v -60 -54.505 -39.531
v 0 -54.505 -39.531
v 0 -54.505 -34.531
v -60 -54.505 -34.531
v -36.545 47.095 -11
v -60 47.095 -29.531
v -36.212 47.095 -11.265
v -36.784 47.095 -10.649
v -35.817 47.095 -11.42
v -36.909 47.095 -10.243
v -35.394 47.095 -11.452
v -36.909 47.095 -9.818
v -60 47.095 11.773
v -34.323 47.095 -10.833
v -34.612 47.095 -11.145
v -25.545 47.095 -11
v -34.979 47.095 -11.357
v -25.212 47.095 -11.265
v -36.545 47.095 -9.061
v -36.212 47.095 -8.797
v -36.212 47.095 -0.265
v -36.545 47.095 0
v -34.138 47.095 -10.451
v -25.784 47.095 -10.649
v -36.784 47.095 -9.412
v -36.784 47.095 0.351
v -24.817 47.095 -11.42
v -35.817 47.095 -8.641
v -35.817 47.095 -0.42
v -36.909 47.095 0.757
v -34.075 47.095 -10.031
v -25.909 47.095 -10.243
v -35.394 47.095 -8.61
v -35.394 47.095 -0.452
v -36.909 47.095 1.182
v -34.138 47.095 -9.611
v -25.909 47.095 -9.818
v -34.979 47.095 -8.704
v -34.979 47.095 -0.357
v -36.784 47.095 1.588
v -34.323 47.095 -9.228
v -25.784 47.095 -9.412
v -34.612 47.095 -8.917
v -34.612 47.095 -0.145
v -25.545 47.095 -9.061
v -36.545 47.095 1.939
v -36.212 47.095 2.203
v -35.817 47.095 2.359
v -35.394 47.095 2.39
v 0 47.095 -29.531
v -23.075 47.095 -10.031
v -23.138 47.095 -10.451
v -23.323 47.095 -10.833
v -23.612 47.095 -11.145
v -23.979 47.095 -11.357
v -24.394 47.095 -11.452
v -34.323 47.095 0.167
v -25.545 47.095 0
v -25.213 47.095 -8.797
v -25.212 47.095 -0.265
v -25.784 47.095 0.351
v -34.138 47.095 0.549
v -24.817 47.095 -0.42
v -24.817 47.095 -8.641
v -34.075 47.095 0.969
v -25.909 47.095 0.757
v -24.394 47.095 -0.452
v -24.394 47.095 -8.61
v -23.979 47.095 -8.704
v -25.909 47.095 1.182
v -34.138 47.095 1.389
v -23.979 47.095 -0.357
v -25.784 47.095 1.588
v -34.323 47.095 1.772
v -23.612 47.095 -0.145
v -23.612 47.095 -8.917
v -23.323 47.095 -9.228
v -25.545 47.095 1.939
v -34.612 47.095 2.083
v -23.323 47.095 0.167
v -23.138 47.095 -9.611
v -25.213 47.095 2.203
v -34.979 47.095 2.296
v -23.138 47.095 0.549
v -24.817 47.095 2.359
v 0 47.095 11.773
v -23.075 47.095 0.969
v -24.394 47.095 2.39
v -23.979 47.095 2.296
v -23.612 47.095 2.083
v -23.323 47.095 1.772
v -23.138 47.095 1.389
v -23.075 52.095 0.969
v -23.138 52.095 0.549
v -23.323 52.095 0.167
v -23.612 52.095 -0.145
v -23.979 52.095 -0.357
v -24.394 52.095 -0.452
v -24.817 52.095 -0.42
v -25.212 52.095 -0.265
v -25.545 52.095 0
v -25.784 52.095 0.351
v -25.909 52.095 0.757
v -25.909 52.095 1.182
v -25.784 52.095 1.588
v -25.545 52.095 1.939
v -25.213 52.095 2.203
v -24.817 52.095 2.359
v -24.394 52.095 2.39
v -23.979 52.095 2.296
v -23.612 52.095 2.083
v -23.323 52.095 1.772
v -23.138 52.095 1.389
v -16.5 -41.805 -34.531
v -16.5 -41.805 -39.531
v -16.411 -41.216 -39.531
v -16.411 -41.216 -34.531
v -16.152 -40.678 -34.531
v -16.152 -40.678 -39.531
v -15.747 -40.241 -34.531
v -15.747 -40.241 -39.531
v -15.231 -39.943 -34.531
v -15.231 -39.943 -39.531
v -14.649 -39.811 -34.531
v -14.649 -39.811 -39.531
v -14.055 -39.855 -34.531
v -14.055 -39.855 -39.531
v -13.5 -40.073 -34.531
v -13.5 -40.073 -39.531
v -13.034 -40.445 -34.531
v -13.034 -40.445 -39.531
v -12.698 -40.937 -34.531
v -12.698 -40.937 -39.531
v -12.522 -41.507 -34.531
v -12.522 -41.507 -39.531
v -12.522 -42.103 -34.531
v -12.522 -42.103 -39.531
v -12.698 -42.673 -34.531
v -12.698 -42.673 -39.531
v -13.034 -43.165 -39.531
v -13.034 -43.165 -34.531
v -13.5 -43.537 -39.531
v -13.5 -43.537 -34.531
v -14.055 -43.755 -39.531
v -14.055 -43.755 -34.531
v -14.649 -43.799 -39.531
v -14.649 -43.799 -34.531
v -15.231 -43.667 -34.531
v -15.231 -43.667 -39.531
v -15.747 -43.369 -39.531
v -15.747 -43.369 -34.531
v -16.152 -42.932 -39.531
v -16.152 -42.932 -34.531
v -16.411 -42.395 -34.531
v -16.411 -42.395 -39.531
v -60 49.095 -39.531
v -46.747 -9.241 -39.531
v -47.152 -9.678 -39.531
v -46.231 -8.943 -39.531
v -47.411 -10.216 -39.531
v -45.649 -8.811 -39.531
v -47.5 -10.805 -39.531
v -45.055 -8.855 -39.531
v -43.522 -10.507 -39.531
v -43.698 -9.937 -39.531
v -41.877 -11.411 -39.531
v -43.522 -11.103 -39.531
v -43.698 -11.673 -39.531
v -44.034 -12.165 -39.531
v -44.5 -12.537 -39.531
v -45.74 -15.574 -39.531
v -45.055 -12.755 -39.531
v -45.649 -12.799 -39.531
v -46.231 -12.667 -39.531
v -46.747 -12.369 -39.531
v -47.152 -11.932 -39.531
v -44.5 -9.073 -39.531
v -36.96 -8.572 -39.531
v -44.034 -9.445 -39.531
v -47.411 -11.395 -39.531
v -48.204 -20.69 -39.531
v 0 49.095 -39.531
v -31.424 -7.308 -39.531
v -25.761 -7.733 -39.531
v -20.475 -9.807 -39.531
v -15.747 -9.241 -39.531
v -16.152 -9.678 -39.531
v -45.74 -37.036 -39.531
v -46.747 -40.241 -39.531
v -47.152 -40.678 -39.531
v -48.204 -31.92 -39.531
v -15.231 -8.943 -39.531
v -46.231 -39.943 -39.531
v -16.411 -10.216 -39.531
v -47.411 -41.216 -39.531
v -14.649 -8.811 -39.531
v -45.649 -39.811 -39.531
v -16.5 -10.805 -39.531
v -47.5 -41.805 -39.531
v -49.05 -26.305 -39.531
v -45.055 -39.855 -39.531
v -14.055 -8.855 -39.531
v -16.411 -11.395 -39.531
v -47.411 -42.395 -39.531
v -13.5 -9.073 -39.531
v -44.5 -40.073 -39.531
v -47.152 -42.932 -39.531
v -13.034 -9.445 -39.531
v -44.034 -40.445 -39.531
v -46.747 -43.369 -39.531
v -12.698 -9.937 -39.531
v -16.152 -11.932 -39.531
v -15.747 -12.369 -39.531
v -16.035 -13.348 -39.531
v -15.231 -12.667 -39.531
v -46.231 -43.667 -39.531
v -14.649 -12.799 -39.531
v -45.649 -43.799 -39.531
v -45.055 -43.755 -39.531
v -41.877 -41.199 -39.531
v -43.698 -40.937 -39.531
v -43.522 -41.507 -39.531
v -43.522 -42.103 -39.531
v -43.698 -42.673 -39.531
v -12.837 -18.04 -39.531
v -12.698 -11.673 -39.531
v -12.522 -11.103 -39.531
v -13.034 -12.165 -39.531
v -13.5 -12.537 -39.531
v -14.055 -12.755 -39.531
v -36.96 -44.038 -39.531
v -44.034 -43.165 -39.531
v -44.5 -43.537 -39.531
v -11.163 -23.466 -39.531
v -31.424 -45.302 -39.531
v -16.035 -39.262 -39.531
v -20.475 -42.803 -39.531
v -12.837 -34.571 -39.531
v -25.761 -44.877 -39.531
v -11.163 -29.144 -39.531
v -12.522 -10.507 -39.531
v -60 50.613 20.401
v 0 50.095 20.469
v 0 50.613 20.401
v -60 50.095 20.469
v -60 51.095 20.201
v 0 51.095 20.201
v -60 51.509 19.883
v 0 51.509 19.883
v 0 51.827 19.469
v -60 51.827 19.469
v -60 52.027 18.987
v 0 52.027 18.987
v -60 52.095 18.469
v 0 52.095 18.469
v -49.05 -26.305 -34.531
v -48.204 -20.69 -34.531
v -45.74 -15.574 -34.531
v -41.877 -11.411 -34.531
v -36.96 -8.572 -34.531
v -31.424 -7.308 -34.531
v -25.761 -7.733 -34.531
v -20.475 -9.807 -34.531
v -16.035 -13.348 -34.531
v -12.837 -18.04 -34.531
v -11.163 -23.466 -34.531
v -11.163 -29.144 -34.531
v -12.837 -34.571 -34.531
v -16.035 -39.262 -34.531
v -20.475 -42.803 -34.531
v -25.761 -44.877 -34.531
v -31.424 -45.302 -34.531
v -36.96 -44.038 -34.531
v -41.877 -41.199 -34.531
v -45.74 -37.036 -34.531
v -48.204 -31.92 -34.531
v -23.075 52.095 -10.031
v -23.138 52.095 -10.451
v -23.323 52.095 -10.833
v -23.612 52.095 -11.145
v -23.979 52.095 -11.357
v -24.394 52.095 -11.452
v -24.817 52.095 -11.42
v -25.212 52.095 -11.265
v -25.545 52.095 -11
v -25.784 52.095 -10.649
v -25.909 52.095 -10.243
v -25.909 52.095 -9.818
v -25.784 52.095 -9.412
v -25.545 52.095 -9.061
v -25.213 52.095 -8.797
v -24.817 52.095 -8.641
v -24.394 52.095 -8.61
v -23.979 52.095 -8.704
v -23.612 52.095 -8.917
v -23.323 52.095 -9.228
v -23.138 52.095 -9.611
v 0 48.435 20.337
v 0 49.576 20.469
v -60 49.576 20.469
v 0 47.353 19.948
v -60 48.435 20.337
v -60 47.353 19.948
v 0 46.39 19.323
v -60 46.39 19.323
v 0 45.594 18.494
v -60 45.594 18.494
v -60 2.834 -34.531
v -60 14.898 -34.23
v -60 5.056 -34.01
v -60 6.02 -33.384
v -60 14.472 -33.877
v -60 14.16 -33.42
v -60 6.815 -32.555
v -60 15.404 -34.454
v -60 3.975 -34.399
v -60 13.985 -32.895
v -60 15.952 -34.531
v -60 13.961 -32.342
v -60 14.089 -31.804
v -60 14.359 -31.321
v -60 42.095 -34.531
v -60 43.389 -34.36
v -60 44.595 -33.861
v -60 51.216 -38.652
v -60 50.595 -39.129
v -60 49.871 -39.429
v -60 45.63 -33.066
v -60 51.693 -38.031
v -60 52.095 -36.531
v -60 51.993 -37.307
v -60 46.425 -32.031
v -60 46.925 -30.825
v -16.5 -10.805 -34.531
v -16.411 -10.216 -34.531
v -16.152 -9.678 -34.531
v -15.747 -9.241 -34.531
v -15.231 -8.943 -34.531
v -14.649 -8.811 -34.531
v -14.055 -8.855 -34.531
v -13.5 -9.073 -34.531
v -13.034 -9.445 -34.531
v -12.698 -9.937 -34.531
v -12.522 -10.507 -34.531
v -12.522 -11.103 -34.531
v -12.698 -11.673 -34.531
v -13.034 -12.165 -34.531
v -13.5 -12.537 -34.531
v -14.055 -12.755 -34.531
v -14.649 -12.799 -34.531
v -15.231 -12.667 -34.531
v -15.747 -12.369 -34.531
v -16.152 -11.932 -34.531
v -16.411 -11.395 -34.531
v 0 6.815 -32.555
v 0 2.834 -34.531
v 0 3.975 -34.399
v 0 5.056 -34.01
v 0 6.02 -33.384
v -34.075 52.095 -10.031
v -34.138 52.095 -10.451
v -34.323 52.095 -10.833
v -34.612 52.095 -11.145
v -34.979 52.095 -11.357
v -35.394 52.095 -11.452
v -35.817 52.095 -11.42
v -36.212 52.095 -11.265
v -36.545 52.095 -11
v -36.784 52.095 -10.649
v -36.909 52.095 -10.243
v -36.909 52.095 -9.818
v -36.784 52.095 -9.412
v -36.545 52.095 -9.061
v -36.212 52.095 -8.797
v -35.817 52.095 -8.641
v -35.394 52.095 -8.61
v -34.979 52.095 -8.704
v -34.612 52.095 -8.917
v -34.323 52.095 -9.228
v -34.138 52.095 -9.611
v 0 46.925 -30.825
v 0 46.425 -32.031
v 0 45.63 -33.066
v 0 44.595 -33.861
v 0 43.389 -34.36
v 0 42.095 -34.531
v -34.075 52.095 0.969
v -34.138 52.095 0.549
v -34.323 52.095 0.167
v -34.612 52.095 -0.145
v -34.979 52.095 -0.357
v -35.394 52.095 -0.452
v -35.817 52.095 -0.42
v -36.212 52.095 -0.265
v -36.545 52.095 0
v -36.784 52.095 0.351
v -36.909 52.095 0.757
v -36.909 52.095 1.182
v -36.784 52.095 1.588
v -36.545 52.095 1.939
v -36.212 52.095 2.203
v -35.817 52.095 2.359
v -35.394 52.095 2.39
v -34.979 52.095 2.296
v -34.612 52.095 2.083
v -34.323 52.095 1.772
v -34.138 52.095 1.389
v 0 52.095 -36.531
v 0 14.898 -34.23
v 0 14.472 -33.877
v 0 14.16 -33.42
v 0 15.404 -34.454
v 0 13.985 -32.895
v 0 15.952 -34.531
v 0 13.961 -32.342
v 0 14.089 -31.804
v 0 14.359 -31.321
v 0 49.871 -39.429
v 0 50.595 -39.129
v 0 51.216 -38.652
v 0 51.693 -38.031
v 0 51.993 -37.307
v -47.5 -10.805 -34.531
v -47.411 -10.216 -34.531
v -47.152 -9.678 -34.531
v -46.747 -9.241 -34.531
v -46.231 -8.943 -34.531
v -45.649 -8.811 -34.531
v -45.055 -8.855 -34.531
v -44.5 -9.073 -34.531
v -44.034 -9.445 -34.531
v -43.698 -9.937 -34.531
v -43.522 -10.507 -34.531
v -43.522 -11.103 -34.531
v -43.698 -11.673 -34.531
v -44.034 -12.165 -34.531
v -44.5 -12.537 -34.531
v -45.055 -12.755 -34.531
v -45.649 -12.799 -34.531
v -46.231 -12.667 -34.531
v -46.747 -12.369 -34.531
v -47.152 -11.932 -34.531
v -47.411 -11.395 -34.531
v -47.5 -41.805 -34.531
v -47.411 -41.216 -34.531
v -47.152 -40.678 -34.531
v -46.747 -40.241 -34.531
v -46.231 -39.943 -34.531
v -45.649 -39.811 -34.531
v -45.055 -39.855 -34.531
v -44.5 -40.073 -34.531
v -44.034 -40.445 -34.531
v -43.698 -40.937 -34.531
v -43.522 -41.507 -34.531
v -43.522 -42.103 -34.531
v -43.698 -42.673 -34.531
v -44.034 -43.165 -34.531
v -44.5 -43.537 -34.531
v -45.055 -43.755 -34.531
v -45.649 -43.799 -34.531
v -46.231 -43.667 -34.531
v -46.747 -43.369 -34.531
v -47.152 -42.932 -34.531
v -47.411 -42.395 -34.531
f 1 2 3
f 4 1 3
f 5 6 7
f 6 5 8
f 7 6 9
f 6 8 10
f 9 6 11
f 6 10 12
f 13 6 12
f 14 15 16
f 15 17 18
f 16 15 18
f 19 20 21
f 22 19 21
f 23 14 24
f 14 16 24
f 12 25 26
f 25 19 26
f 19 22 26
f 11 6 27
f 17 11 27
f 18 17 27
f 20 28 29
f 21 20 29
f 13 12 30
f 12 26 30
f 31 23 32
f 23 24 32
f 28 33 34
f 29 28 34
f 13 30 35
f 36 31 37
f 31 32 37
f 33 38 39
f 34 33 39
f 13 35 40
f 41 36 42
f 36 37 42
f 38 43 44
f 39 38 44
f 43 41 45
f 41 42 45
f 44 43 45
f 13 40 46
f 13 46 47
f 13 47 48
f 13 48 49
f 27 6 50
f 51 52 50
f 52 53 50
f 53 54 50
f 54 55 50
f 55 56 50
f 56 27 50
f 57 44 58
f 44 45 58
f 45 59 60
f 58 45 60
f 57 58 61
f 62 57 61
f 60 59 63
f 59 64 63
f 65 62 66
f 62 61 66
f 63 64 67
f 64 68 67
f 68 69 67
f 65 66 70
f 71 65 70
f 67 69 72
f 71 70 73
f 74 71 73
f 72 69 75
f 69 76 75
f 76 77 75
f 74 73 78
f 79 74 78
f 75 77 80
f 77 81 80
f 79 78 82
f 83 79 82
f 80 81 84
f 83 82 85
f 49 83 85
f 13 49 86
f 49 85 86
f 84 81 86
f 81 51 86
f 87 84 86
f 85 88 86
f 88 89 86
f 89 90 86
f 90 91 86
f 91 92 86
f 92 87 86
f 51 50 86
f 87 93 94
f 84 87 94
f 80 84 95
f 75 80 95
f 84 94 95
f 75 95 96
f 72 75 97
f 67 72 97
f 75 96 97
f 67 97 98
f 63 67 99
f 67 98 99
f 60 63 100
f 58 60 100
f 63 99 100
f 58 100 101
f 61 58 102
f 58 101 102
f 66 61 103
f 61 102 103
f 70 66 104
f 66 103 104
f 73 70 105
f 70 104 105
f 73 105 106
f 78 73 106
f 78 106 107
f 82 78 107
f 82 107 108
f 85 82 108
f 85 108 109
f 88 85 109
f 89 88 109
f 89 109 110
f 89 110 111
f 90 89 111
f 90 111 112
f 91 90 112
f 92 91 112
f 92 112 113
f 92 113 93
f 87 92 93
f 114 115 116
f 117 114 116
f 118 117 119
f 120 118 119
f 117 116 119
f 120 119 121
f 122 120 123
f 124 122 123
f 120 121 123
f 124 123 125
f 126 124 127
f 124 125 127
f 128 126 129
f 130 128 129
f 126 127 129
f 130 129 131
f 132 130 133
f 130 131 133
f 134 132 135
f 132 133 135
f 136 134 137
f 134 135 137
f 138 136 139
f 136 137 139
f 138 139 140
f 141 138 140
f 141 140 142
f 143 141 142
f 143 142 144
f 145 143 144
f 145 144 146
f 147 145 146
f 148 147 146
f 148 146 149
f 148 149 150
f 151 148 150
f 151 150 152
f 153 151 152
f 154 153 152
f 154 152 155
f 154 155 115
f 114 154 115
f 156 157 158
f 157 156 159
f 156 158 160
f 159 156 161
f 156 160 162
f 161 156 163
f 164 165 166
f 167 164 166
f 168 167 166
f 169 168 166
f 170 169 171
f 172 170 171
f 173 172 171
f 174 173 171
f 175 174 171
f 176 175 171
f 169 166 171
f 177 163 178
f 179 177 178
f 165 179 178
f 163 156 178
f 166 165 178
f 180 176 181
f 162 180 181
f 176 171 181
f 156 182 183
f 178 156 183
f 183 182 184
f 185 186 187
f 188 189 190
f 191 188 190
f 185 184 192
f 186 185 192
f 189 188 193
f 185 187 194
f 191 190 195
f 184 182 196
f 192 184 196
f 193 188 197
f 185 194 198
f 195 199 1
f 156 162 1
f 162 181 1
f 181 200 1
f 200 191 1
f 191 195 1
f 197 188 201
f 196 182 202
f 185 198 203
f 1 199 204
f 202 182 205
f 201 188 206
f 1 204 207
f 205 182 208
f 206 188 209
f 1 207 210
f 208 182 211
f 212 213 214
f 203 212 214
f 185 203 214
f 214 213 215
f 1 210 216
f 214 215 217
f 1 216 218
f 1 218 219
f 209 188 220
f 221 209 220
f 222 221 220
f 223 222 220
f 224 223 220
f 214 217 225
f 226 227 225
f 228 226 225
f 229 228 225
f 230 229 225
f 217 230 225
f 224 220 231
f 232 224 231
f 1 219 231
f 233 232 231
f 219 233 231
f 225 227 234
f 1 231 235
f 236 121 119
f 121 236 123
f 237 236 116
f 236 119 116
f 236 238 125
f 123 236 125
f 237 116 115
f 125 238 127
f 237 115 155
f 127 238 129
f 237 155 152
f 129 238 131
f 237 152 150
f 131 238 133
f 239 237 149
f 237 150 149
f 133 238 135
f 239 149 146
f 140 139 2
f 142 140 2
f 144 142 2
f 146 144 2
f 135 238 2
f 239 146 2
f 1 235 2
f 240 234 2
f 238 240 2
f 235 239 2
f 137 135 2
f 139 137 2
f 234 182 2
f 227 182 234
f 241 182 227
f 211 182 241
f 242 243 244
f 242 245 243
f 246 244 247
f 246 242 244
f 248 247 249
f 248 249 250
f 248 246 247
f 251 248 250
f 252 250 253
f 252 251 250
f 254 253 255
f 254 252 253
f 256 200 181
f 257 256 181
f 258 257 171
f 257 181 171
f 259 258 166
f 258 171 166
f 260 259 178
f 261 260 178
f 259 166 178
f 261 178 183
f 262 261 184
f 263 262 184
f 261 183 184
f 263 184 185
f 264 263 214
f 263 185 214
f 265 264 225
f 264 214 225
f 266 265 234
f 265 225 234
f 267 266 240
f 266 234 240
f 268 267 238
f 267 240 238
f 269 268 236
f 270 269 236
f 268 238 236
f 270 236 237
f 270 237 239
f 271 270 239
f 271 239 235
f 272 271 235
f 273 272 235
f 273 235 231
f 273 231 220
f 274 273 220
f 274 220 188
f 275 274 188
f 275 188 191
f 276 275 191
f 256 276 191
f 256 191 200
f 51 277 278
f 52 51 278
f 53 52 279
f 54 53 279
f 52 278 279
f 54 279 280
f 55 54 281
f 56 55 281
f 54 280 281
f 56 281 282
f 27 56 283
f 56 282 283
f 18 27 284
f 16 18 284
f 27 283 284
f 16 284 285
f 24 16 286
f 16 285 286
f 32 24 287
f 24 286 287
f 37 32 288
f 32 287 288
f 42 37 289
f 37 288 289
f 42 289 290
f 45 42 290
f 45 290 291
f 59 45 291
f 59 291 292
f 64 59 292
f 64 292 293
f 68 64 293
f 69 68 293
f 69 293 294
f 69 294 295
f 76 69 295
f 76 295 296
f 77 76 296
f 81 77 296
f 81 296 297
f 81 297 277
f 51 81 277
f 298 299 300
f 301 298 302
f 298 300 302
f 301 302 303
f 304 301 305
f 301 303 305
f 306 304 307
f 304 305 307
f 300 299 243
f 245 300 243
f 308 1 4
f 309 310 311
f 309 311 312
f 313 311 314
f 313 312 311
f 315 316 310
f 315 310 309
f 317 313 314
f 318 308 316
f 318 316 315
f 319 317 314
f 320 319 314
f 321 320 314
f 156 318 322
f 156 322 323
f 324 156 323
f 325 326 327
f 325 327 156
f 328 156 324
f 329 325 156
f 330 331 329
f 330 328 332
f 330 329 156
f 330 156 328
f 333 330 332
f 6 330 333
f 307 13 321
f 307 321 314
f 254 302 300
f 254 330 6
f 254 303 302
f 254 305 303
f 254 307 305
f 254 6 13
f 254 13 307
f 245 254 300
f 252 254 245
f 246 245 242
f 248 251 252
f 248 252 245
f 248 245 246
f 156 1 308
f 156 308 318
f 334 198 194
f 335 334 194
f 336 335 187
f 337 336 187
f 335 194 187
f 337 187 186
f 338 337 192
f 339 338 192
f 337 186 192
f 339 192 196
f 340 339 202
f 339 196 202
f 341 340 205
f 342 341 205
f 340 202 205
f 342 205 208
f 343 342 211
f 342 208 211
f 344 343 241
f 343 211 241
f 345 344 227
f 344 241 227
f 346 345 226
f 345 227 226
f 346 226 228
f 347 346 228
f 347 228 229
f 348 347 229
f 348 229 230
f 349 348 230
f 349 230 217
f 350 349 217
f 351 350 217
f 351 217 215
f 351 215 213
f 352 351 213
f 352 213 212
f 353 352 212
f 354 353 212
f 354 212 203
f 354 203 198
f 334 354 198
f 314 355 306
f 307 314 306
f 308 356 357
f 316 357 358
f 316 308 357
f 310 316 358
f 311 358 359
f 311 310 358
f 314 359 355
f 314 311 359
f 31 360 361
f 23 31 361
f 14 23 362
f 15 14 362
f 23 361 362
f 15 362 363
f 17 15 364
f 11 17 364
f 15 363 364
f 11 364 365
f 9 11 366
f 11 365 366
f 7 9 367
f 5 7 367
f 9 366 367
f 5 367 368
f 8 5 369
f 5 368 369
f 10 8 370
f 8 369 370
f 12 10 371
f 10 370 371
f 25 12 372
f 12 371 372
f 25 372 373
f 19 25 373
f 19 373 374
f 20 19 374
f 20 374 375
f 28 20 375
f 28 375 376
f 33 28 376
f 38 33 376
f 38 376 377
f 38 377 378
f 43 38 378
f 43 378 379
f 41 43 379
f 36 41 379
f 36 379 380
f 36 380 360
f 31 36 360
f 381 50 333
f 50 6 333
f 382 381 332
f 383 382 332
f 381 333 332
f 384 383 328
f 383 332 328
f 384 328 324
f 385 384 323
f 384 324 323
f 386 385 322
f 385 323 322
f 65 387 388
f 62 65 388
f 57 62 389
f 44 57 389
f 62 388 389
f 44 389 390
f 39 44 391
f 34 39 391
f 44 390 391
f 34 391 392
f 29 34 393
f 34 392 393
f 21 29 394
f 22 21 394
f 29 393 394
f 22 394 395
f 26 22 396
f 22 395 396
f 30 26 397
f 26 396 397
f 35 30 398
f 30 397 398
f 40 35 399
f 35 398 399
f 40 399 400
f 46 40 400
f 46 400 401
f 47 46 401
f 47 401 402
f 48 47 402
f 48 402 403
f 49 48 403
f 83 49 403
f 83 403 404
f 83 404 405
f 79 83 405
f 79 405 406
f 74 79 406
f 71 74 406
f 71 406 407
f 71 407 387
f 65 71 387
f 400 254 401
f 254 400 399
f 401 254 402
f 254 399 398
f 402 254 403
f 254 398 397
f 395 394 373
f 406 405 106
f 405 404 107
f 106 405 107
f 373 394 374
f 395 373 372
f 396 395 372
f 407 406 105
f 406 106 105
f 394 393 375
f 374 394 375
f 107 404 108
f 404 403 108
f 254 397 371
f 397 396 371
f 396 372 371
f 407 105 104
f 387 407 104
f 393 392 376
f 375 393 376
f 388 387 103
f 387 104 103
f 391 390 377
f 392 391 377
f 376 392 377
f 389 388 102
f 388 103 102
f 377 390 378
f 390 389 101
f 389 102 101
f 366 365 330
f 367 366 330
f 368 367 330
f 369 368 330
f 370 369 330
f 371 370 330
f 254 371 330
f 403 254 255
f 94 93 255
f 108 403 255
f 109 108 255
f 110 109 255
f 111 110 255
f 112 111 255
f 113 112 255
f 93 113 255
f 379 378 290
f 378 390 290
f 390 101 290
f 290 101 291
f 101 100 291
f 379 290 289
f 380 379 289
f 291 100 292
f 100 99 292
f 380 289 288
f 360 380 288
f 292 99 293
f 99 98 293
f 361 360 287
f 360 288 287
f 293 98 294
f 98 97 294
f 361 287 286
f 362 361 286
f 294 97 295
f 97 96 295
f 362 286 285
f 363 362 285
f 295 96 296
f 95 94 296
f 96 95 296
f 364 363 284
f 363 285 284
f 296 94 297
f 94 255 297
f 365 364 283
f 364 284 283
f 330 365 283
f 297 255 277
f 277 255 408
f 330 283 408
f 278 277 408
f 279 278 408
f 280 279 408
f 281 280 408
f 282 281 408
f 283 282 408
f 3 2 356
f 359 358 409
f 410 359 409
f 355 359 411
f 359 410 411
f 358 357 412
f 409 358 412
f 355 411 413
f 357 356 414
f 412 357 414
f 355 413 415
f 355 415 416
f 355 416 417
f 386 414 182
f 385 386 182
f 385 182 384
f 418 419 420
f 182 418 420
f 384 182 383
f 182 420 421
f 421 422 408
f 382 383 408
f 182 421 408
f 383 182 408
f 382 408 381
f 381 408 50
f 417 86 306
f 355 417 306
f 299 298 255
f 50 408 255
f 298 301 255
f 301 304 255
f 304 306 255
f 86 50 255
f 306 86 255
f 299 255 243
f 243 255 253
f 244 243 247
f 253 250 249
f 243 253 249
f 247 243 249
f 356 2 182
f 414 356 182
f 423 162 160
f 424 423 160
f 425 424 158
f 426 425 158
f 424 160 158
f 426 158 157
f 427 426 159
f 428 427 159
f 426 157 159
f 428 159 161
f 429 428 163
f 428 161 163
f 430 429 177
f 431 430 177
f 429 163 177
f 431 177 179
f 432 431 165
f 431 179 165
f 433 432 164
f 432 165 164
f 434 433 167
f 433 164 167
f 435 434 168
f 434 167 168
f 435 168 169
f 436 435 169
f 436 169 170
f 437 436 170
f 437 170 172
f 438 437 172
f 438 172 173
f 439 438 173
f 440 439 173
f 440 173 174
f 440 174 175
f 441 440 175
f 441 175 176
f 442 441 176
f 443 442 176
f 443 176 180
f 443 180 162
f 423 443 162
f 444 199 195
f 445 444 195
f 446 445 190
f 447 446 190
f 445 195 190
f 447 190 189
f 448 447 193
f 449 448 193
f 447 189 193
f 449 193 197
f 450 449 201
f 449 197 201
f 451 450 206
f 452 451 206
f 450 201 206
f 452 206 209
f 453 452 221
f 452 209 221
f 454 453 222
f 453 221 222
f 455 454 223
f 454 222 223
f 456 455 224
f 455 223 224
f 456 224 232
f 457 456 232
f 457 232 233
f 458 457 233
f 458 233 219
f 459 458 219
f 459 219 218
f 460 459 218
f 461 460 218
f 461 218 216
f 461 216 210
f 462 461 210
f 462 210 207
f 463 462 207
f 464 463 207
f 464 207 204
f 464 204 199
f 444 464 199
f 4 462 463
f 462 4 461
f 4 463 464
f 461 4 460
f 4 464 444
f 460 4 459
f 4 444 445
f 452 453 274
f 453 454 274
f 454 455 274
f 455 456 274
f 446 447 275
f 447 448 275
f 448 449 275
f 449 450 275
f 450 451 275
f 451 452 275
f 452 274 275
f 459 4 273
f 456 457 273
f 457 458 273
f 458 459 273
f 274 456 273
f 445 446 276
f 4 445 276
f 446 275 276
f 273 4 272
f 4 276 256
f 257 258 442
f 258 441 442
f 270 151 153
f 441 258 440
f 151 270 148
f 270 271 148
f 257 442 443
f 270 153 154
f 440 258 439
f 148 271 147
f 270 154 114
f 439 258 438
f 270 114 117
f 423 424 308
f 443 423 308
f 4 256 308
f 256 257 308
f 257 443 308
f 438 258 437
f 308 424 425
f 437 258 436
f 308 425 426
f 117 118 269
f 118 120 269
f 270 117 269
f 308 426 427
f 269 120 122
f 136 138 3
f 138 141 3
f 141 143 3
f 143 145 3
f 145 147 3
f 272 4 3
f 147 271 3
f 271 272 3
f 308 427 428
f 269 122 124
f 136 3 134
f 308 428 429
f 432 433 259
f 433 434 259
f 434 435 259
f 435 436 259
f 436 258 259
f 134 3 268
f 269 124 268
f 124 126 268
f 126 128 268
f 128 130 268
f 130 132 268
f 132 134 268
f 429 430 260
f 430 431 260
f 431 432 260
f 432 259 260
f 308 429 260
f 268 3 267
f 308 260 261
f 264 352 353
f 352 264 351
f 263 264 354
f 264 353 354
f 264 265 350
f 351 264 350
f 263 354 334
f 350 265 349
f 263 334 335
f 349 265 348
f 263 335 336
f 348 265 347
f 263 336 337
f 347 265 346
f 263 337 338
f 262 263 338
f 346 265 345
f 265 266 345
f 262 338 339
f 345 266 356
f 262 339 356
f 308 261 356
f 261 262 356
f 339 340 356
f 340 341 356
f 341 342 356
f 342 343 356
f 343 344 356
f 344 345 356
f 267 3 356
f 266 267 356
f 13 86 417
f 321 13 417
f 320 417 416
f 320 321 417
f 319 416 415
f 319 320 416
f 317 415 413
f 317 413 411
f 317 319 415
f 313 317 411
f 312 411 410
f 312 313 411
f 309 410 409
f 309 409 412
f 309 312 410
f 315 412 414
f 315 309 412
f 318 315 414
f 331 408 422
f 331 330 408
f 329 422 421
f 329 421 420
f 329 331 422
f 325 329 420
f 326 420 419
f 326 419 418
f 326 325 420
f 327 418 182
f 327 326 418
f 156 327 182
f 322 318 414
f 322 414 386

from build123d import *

# Parameters (mm, degrees)
BOSS_EXTRUDE1_DEPTH = 60
CUT_EXTRUDE2_REACH  = 108.6
SKETCH2_R           = 1.425
CUT_EXTRUDE3_REACH  = 62
SKETCH7_R           = 2
SKETCH7_R_2         = 19.05
FILLET2_R           = 5
FILLET4_R           = 5
FILLET5_R           = 2
FILLET6_R           = 2
FILLET7_R           = 3
FILLET8_R           = 5


with BuildPart() as part:
    # Sketch1 → Boss-Extrude1 (new body)
    with BuildSketch(Plane(origin=(0, 0, 0), x_dir=(0, 0, -1), z_dir=(1, 0, 0))):
        Polygon((-20.469264339, 47.094964584), (-20.469264339, 52.094964584), (39.530735661, 52.094964584), (39.530735661, -54.505035416), (34.530735661, -54.505035416), (34.530735661, 5.314612494), align=None)
        Polygon((-11.77256872, 47.094964584), (34.530735661, 11.920994403), (34.530735661, 47.094964584), align=None, mode=Mode.SUBTRACT)
    extrude(amount=-BOSS_EXTRUDE1_DEPTH)

    # Sketch2 → Cut-Extrude2 (cut, up to next)
    with BuildSketch(Plane(origin=(0, 52.094964584, 0), x_dir=(1, 0, 0), z_dir=(0, 1, 0)), mode=Mode.PRIVATE) as cut_extrude2_sk1:
        with Locations((-35.5, 10.030735661)):
            Circle(SKETCH2_R)
    cut_extrude2_tool1 = extrude(cut_extrude2_sk1.sketch, amount=-CUT_EXTRUDE2_REACH, mode=Mode.PRIVATE) & part.part
    add(cut_extrude2_tool1.solids().sort_by_distance((-35.5, 52.094965, -10.030736))[0], mode=Mode.SUBTRACT)
    # Sketch2 → Cut-Extrude2 (cut, up to next)
    with BuildSketch(Plane(origin=(0, 52.094964584, 0), x_dir=(1, 0, 0), z_dir=(0, 1, 0)), mode=Mode.PRIVATE) as cut_extrude2_sk2:
        with Locations((-24.5, 10.030735661)):
            Circle(SKETCH2_R)
    cut_extrude2_tool2 = extrude(cut_extrude2_sk2.sketch, amount=-CUT_EXTRUDE2_REACH, mode=Mode.PRIVATE) & part.part
    add(cut_extrude2_tool2.solids().sort_by_distance((-24.5, 52.094965, -10.030736))[0], mode=Mode.SUBTRACT)
    # Sketch2 → Cut-Extrude2 (cut, up to next)
    with BuildSketch(Plane(origin=(0, 52.094964584, 0), x_dir=(1, 0, 0), z_dir=(0, 1, 0)), mode=Mode.PRIVATE) as cut_extrude2_sk3:
        with Locations((-24.5, -0.969264339)):
            Circle(SKETCH2_R)
    cut_extrude2_tool3 = extrude(cut_extrude2_sk3.sketch, amount=-CUT_EXTRUDE2_REACH, mode=Mode.PRIVATE) & part.part
    add(cut_extrude2_tool3.solids().sort_by_distance((-24.5, 52.094965, 0.969264))[0], mode=Mode.SUBTRACT)
    # Sketch2 → Cut-Extrude2 (cut, up to next)
    with BuildSketch(Plane(origin=(0, 52.094964584, 0), x_dir=(1, 0, 0), z_dir=(0, 1, 0)), mode=Mode.PRIVATE) as cut_extrude2_sk4:
        with Locations((-35.5, -0.969264339)):
            Circle(SKETCH2_R)
    cut_extrude2_tool4 = extrude(cut_extrude2_sk4.sketch, amount=-CUT_EXTRUDE2_REACH, mode=Mode.PRIVATE) & part.part
    add(cut_extrude2_tool4.solids().sort_by_distance((-35.5, 52.094965, 0.969264))[0], mode=Mode.SUBTRACT)

    # Sketch7 → Cut-Extrude3 (cut, up to next)
    with BuildSketch(Plane(origin=(0, 0, -39.530735661), x_dir=(-1, 0, 0), z_dir=(0, 0, -1)), mode=Mode.PRIVATE) as cut_extrude3_sk1:
        with Locations((14.5, -10.805035416)):
            Circle(SKETCH7_R)
    cut_extrude3_tool1 = extrude(cut_extrude3_sk1.sketch, amount=-CUT_EXTRUDE3_REACH, mode=Mode.PRIVATE) & part.part
    add(cut_extrude3_tool1.solids().sort_by_distance((-14.5, -10.805035, -39.530736))[0], mode=Mode.SUBTRACT)
    # Sketch7 → Cut-Extrude3 (cut, up to next)
    with BuildSketch(Plane(origin=(0, 0, -39.530735661), x_dir=(-1, 0, 0), z_dir=(0, 0, -1)), mode=Mode.PRIVATE) as cut_extrude3_sk2:
        with Locations((45.5, -10.805035416)):
            Circle(SKETCH7_R)
    cut_extrude3_tool2 = extrude(cut_extrude3_sk2.sketch, amount=-CUT_EXTRUDE3_REACH, mode=Mode.PRIVATE) & part.part
    add(cut_extrude3_tool2.solids().sort_by_distance((-45.5, -10.805035, -39.530736))[0], mode=Mode.SUBTRACT)
    # Sketch7 → Cut-Extrude3 (cut, up to next)
    with BuildSketch(Plane(origin=(0, 0, -39.530735661), x_dir=(-1, 0, 0), z_dir=(0, 0, -1)), mode=Mode.PRIVATE) as cut_extrude3_sk3:
        with Locations((45.5, -41.805035416)):
            Circle(SKETCH7_R)
    cut_extrude3_tool3 = extrude(cut_extrude3_sk3.sketch, amount=-CUT_EXTRUDE3_REACH, mode=Mode.PRIVATE) & part.part
    add(cut_extrude3_tool3.solids().sort_by_distance((-45.5, -41.805035, -39.530736))[0], mode=Mode.SUBTRACT)
    # Sketch7 → Cut-Extrude3 (cut, up to next)
    with BuildSketch(Plane(origin=(0, 0, -39.530735661), x_dir=(-1, 0, 0), z_dir=(0, 0, -1)), mode=Mode.PRIVATE) as cut_extrude3_sk4:
        with Locations((14.5, -41.805035416)):
            Circle(SKETCH7_R)
    cut_extrude3_tool4 = extrude(cut_extrude3_sk4.sketch, amount=-CUT_EXTRUDE3_REACH, mode=Mode.PRIVATE) & part.part
    add(cut_extrude3_tool4.solids().sort_by_distance((-14.5, -41.805035, -39.530736))[0], mode=Mode.SUBTRACT)
    # Sketch7 → Cut-Extrude3 (cut, up to next)
    with BuildSketch(Plane(origin=(0, 0, -39.530735661), x_dir=(-1, 0, 0), z_dir=(0, 0, -1)), mode=Mode.PRIVATE) as cut_extrude3_sk5:
        with Locations((30, -26.305035416)):
            Circle(SKETCH7_R_2)
    cut_extrude3_tool5 = extrude(cut_extrude3_sk5.sketch, amount=-CUT_EXTRUDE3_REACH, mode=Mode.PRIVATE) & part.part
    add(cut_extrude3_tool5.solids().sort_by_distance((-30, -26.305035, -39.530736))[0], mode=Mode.SUBTRACT)

    # Fillet2
    fillet2_edges = [part.edges().sort_by_distance(p)[0] for p in [
        (-30, 47.094964584, -34.530735661),
    ]]
    fillet(fillet2_edges, radius=FILLET2_R)

    # Fillet4
    fillet4_edges = [part.edges().sort_by_distance(p)[0] for p in [
        (-30, 47.094964584, 20.469264339),
    ]]
    fillet(fillet4_edges, radius=FILLET4_R)

    # Fillet5
    fillet5_edges = [part.edges().sort_by_distance(p)[0] for p in [
        (-30, 11.920994403, -34.530735661),
    ]]
    fillet(fillet5_edges, radius=FILLET5_R)

    # Fillet6
    fillet6_edges = [part.edges().sort_by_distance(p)[0] for p in [
        (-30, 52.094964584, 20.469264339),
    ]]
    fillet(fillet6_edges, radius=FILLET6_R)

    # Fillet7
    fillet7_edges = [part.edges().sort_by_distance(p)[0] for p in [
        (-30, 52.094964584, -39.530735661),
    ]]
    fillet(fillet7_edges, radius=FILLET7_R)

    # Fillet8
    fillet8_edges = [part.edges().sort_by_distance(p)[0] for p in [
        (-30, 5.314612494, -34.530735661),
    ]]
    fillet(fillet8_edges, radius=FILLET8_R)


solid = part.part
